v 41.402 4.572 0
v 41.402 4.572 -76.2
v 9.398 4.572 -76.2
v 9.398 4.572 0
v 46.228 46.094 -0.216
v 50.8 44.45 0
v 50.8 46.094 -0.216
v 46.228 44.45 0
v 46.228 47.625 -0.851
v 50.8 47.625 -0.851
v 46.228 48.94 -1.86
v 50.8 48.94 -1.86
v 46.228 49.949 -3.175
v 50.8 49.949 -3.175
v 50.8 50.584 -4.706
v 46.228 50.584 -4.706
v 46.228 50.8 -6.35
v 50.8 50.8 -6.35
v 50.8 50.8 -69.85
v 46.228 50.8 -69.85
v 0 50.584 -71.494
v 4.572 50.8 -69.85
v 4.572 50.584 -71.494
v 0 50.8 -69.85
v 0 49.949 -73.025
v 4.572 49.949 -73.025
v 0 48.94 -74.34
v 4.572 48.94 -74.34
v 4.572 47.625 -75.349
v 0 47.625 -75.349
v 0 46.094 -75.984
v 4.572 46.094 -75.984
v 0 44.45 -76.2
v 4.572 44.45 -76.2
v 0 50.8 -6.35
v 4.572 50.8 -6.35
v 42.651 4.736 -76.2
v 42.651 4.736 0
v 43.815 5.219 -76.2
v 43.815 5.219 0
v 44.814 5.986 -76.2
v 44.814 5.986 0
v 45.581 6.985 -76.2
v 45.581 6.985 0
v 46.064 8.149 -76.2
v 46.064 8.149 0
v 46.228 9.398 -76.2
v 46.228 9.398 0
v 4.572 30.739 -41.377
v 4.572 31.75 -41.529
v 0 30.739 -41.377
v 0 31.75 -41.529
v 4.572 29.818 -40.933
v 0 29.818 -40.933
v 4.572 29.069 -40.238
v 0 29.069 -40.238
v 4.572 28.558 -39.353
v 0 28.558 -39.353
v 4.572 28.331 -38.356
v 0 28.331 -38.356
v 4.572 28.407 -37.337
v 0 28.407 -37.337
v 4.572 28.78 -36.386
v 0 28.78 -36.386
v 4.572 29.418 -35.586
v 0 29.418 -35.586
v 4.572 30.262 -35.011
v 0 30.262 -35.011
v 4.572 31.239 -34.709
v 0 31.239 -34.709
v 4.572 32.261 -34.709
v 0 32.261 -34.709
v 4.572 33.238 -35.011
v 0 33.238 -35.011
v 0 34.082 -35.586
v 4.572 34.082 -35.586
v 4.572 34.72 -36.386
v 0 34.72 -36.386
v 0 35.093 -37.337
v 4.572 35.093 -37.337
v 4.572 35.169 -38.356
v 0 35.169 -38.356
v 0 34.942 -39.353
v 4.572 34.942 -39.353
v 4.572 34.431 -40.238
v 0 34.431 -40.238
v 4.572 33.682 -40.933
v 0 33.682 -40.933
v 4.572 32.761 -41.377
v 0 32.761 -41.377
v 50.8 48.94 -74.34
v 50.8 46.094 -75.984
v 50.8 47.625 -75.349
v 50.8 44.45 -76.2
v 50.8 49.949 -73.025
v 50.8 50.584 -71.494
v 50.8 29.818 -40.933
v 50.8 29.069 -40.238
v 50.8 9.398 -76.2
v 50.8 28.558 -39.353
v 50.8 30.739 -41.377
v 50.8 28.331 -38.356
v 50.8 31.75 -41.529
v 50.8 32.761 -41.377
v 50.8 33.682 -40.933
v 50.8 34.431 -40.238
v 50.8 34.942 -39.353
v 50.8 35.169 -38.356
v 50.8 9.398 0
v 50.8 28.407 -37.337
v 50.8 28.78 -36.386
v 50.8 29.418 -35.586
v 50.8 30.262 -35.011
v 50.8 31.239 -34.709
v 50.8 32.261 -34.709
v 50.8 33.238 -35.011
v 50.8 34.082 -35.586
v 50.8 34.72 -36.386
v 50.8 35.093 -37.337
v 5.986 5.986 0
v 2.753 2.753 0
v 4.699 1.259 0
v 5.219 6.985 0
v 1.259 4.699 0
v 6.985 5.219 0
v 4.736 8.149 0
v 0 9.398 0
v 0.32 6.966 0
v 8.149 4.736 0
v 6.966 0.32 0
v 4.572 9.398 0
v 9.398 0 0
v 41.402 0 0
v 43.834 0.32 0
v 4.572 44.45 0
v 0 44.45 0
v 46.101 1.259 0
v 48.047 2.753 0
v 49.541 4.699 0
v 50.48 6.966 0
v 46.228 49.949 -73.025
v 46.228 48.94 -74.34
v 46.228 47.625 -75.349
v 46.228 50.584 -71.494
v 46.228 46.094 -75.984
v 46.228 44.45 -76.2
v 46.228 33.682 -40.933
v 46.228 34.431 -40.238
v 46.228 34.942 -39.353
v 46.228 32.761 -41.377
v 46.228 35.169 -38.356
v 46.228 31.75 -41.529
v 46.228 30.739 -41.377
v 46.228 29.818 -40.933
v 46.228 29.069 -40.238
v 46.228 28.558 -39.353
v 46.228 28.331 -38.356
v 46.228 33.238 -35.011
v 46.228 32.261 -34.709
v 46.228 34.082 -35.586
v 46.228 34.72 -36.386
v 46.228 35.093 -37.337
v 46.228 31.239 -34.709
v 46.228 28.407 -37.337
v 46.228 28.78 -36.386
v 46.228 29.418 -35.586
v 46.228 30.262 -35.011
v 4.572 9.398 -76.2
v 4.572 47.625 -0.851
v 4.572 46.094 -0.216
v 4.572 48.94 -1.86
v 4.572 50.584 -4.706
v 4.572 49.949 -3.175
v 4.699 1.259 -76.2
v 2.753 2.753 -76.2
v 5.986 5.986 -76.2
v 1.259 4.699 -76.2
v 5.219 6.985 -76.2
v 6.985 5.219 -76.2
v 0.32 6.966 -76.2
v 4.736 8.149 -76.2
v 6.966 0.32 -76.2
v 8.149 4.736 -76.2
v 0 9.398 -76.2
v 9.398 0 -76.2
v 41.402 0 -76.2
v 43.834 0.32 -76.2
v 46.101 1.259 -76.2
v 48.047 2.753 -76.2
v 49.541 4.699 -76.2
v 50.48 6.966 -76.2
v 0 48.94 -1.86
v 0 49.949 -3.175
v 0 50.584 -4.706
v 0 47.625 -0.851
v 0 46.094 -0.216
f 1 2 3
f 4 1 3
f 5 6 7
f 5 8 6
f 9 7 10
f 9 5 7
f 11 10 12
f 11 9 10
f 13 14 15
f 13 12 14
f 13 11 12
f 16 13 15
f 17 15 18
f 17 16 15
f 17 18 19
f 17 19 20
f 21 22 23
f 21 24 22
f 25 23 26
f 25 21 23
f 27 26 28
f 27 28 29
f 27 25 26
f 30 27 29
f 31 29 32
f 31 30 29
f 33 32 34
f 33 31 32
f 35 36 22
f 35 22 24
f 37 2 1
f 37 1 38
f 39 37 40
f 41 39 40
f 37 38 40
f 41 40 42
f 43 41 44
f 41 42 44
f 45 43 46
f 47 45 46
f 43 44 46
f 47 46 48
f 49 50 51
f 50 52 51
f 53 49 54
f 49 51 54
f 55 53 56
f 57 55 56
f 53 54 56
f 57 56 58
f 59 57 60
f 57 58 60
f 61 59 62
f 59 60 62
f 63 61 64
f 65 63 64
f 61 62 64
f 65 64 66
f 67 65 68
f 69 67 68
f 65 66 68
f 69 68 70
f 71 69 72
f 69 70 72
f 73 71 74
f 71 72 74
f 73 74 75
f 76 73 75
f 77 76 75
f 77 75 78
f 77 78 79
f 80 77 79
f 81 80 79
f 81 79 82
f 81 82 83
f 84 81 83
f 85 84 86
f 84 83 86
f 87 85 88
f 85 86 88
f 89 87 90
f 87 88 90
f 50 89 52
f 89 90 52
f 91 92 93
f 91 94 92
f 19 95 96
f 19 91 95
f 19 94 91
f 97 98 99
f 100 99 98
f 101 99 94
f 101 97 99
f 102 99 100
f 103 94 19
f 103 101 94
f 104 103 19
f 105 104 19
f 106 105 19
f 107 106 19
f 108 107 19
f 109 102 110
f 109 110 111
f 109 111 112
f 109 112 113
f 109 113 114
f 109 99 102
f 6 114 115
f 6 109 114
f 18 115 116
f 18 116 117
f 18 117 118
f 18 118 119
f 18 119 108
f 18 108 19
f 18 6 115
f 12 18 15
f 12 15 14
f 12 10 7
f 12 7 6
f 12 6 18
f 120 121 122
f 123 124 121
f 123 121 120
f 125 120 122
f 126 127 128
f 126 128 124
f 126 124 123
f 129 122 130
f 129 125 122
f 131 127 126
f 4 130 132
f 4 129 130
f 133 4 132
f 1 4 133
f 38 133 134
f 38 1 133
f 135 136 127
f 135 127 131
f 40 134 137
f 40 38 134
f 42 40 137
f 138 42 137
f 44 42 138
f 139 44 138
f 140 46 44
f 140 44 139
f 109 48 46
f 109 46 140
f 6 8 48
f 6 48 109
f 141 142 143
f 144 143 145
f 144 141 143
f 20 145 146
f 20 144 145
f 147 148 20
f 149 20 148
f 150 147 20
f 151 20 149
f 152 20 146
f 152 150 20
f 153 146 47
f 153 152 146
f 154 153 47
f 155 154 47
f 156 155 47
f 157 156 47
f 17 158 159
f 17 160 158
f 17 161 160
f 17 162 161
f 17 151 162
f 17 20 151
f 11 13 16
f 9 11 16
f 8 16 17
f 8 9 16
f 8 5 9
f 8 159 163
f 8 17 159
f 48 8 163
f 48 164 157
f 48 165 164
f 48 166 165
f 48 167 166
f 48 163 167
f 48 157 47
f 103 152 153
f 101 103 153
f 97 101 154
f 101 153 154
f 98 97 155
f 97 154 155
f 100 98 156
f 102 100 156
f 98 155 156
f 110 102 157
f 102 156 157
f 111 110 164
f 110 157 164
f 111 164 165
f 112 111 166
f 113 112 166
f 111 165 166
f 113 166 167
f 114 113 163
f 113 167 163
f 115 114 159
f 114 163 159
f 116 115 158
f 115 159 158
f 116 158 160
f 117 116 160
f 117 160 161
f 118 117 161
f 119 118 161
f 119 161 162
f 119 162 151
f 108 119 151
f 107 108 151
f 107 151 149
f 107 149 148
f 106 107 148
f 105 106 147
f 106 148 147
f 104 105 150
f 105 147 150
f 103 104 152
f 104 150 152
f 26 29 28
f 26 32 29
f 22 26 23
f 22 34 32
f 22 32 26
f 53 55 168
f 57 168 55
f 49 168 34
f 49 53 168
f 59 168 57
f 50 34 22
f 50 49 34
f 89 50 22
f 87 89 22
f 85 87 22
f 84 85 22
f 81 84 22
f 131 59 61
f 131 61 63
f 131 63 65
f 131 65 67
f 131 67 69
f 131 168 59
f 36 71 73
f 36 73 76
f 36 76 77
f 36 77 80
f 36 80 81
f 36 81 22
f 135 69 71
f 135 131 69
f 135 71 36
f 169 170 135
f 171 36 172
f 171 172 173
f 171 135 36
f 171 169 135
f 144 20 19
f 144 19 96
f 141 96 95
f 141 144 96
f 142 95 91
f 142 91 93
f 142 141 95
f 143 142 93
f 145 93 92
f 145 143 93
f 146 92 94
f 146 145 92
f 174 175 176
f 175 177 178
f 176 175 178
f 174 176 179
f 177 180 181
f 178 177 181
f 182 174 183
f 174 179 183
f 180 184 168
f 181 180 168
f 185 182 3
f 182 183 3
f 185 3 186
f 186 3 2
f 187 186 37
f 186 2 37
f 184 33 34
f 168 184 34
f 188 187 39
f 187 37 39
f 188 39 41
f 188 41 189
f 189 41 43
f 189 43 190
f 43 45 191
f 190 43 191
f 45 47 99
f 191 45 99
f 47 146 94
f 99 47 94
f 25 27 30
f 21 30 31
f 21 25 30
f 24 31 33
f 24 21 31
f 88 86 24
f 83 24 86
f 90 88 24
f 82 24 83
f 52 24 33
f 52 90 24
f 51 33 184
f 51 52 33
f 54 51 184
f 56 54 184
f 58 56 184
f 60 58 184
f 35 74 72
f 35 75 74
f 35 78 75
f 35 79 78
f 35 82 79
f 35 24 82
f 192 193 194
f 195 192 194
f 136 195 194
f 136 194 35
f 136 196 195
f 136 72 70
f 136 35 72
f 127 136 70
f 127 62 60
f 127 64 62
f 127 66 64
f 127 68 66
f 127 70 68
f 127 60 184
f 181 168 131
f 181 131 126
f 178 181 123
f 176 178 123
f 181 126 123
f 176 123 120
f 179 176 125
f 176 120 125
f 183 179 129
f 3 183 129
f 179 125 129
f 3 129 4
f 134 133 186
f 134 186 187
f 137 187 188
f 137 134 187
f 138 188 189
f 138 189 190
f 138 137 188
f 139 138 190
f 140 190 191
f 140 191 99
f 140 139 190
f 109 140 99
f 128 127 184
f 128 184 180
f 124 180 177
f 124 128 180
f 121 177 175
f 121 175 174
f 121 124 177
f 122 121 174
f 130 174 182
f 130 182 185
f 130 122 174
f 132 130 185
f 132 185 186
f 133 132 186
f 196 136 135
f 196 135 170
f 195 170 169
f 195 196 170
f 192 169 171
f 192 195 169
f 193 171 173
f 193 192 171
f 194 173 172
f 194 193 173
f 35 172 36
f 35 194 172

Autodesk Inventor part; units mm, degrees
ref_plane "YZ Plane" through (0, 0, 0) normal (1, 0, 0) x (0, 1, 0)
ref_plane "XZ Plane" through (0, 0, 0) normal (0, 1, 0) x (-1, 0, 0)
ref_plane "XY Plane" through (0, 0, 0) normal (0, 0, 1) x (1, 0, 0)
sketch "Sketch1" plane through (0, 0, 0) normal (0, 0, 1) x (1, 0, 0)
  line L0 (9.398, 0) -> (41.402, 0)
  line L1 (50.8, 9.398) -> (50.8, 50.8)
  line L2 (50.8, 50.8) -> (46.228, 50.8)
  line L3 (46.228, 50.8) -> (46.228, 9.398)
  line L4 (41.402, 4.572) -> (9.398, 4.572)
  line L5 (4.572, 9.398) -> (4.572, 50.8)
  line L6 (4.572, 50.8) -> (0, 50.8)
  line L7 (0, 50.8) -> (0, 9.398)
  arc A0 (4.572, 9.398) -> (9.398, 4.572) centre (9.398, 9.398) ccw
  arc A1 (41.402, 4.572) -> (46.228, 9.398) centre (41.402, 9.398) ccw
  arc A2 (0, 9.398) -> (9.398, 0) centre (9.398, 9.398) ccw
  arc A3 (41.402, 0) -> (50.8, 9.398) centre (41.402, 9.398) ccw
  point P0 (0, 0)
  point P1 (50.8, 0)
  dimension "d0" = 50.8
  dimension "d1" = 50.8
  dimension "d2" = 4.572
  dimension "d3" = 4.572
  dimension "d4" = 4.572
  dimension "d5" = 4.826
  dimension "d6" = 9.398
extrude "Extrusion1" add sketch "Sketch1" against normal blind 76.2
fillet "Fillet1" radius 6.35 4 edges at (2.286, 50.8, 0) (48.514, 50.8, 0) (2.286, 50.8, -76.2) (48.514, 50.8, -76.2)
sketch "Sketch2" plane through (50.8, 9.398, 0) normal (1, 0, 0) x (0, 0, -1)
  line L0 (6.35, 41.402) -> (69.85, 41.402) projected
  line L1 (0, -9.398) -> (76.2, -9.398) projected
  point P0 (38.1, 22.352)
  point P1 (38.1, 41.402)
  dimension "d10" = 31.75
hole "Hole1" at (50.8, 31.75, -38.1) direction (-1, 0, 0) diameter 6.858 end through all
ref_plane "Work Plane1" through (25.4, 9.398, 0) normal (1, 0, 0) x (0, 0, -1)
ref_plane "Work Plane2" through (0, 0, -38.1) normal (0, 0, -1) x (-1, 0, 0)
equation "\"d3\" = d2"
equation "\"d4\" = d2"
properties part number "GE-13025-02" material "Steel"
